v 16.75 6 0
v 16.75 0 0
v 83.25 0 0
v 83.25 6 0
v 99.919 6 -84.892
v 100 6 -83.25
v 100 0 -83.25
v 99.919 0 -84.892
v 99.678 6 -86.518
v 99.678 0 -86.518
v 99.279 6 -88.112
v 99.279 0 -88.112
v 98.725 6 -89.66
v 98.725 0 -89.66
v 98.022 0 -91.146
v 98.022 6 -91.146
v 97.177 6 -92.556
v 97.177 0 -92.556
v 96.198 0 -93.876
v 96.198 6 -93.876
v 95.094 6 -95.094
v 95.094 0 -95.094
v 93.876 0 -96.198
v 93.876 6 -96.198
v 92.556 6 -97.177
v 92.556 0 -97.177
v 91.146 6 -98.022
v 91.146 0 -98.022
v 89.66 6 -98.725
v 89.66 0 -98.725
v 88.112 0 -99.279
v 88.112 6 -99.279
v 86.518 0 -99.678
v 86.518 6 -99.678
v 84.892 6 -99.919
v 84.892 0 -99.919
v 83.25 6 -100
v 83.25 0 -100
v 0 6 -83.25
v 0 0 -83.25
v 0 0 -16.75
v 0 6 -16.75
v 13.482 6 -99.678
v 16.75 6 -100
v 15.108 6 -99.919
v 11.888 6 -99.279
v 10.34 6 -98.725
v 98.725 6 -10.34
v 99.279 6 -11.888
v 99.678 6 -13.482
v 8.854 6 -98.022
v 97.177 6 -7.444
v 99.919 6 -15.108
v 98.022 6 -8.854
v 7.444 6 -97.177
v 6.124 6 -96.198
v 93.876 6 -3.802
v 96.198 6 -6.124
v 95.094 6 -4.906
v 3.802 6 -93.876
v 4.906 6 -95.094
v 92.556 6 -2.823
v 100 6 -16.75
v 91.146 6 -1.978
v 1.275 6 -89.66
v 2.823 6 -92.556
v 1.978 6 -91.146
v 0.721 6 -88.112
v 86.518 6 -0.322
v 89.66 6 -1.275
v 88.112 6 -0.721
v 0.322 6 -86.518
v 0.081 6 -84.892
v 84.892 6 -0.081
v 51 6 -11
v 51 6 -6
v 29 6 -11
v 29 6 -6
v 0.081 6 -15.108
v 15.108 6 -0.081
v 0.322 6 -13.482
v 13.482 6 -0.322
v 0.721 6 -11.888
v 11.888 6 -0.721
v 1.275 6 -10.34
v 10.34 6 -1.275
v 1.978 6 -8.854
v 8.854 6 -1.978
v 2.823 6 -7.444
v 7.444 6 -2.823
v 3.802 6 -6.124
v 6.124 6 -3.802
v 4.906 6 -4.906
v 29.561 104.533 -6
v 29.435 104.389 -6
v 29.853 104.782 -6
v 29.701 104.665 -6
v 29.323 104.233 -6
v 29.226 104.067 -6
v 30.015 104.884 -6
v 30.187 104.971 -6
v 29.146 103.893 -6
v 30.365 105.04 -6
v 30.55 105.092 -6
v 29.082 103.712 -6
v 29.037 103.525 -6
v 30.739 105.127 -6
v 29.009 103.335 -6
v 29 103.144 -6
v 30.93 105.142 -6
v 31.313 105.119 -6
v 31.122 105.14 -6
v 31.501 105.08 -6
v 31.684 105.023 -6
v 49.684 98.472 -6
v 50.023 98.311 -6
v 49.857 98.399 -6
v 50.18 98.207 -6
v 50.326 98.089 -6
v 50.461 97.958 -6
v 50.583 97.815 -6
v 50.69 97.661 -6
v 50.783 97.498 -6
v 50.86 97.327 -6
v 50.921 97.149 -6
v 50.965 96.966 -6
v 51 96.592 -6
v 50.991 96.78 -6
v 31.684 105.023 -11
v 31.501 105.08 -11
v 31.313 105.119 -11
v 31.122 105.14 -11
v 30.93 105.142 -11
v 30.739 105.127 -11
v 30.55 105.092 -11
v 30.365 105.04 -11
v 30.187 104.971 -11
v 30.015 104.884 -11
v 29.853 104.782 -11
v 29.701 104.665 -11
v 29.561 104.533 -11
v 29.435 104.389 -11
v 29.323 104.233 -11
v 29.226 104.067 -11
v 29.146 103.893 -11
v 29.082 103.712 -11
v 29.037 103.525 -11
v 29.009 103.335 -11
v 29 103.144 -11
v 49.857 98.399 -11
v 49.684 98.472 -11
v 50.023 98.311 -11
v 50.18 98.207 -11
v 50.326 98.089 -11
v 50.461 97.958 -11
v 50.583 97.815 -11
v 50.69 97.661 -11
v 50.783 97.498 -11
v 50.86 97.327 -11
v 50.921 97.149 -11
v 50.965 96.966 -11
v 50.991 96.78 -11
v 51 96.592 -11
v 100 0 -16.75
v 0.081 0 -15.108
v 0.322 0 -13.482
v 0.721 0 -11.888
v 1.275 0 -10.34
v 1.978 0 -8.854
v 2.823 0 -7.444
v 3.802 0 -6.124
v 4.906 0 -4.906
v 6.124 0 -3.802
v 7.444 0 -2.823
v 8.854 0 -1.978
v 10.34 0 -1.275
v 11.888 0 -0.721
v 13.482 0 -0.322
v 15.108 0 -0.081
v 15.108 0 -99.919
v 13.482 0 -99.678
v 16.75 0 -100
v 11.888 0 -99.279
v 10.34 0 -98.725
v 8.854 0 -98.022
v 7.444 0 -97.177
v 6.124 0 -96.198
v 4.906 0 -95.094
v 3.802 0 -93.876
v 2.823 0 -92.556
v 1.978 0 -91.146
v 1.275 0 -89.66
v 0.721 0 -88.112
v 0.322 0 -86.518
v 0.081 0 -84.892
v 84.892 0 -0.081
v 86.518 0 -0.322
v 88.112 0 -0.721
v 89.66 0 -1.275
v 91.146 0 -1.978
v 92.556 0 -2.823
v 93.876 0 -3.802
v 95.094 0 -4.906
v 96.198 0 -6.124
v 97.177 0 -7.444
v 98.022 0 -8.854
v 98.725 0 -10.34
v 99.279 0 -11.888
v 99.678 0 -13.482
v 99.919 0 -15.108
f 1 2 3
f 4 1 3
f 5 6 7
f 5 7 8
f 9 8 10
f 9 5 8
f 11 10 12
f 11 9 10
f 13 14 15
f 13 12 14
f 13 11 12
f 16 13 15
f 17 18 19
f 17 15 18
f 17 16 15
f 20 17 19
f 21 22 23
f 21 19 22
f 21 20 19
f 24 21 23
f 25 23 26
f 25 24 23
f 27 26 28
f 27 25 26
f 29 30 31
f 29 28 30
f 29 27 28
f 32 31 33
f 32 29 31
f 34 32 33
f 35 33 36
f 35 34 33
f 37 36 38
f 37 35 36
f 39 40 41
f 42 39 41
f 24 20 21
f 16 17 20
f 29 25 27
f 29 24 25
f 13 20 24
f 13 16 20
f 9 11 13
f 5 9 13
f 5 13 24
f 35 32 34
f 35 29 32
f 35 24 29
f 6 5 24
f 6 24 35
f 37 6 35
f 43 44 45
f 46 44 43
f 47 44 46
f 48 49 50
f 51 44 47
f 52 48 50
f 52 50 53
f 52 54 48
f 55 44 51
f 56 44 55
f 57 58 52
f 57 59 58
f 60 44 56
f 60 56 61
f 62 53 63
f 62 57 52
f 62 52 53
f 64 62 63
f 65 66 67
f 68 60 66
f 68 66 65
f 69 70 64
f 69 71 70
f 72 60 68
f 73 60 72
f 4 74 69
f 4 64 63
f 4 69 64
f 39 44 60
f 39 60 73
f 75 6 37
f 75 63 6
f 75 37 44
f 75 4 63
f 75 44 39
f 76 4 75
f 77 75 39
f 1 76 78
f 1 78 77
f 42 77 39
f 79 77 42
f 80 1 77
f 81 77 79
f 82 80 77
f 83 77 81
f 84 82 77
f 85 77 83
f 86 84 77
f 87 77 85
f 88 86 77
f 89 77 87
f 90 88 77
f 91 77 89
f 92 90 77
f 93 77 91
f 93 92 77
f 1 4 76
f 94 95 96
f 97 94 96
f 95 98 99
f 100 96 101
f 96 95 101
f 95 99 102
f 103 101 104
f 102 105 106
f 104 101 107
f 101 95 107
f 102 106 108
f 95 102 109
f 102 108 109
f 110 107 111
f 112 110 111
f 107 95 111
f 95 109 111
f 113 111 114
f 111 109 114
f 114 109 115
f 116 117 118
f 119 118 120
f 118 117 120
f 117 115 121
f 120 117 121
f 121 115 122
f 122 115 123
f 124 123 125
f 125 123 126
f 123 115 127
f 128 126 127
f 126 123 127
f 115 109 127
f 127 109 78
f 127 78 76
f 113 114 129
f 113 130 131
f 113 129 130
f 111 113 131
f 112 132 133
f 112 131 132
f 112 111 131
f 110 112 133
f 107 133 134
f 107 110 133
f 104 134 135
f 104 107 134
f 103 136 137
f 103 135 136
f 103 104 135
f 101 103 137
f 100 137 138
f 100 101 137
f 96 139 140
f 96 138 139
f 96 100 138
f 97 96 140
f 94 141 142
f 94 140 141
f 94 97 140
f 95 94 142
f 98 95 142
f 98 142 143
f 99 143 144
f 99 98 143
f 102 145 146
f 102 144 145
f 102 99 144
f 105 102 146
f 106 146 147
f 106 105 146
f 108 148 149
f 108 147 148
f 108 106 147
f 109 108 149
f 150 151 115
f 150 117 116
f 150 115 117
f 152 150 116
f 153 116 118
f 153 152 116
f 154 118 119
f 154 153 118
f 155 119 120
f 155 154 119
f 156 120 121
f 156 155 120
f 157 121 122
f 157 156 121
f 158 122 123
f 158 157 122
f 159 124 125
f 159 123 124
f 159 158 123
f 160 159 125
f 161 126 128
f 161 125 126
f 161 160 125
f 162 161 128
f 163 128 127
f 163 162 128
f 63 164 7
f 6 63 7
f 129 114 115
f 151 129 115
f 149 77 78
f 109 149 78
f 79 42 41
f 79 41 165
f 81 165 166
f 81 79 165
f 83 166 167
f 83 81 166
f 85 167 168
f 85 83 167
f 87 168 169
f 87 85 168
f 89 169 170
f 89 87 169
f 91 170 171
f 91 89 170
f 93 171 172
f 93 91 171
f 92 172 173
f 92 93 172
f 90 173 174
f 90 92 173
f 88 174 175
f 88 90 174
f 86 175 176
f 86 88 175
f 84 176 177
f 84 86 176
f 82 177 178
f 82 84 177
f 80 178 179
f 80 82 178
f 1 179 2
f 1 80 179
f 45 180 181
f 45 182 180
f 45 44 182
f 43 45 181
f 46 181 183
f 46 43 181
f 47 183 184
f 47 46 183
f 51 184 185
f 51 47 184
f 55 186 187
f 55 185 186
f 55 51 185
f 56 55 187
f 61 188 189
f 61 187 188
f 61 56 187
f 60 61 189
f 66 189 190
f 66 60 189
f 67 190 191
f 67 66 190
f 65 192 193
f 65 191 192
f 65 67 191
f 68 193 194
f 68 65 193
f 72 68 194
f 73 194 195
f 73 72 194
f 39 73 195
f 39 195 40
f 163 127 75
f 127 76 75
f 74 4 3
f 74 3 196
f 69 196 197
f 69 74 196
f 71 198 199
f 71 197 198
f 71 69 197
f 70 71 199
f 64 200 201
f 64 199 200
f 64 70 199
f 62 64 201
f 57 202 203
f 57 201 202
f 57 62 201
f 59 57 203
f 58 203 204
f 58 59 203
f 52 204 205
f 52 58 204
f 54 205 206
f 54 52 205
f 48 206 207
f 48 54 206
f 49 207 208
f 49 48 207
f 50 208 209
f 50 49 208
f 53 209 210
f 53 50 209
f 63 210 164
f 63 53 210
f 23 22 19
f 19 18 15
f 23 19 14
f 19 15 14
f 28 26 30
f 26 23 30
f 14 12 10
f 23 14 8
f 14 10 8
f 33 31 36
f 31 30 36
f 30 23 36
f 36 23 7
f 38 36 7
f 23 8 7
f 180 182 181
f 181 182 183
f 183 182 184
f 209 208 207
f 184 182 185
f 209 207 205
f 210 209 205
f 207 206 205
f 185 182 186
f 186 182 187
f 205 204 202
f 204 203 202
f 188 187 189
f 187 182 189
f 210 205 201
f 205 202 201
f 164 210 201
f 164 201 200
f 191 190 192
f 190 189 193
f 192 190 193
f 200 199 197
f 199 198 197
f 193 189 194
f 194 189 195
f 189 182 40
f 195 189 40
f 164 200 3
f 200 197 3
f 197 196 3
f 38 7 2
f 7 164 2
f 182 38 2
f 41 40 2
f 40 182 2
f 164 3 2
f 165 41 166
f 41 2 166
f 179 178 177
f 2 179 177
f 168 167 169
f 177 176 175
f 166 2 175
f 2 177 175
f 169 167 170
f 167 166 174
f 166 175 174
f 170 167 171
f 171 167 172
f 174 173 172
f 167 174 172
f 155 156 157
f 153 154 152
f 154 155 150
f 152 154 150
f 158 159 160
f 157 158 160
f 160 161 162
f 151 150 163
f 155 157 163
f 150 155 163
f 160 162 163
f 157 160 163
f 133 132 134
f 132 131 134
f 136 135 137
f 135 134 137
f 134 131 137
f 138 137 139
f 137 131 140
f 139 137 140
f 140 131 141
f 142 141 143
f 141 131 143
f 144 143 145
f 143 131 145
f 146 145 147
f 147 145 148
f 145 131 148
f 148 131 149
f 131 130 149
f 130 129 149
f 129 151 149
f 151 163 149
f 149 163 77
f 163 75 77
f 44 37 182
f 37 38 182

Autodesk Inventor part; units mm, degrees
ref_plane "YZ Plane" through (0, 0, 0) normal (1, 0, 0) x (0, 1, 0)
ref_plane "XZ Plane" through (0, 0, 0) normal (0, 1, 0) x (-1, 0, 0)
ref_plane "XY Plane" through (0, 0, 0) normal (0, 0, 1) x (1, 0, 0)
sketch "Sketch1" plane through (0, 0, 0) normal (0, 1, 0) x (-1, 0, 0)
  line L0 (0, 0) -> (-100, 0)
  line L1 (-100, 0) -> (-100, -100)
  line L2 (-100, -100) -> (0, -100)
  line L3 (0, -100) -> (0, 0)
  dimension "d0" = 100
  dimension "d1" = 100
extrude "Extrusion1" add sketch "Sketch1" along normal blind 6
fillet "Fillet1" radius 16.75 4 edges at (100, 3, 0) (100, 3, -100) (0, 3, 0) (0, 3, -100)
sketch "Sketch2" plane through (0, 6, 0) normal (0, 1, 0) x (1, 0, 0)
  line L0 (16.75, 0) -> (83.25, 0) projected
  line L1 (40, 6) -> (51, 6)
  line L2 (51, 6) -> (51, 11)
  line L3 (51, 11) -> (29, 11)
  line L4 (29, 11) -> (29, 6)
  line L5 (29, 6) -> (40, 6)
  point P0 (0, 0)
extrude "Extrusion2" add sketch "Sketch2" along normal blind 100
sketch "Sketch3" plane through (29, 6, -6) normal (0, 0, 1) x (1, 0, 0)
  line L0 (0, 100) -> (22, 100) projected
  line L1 (0, 100) -> (22, 91.9927)
  line L2 (22, 0) -> (22, 100) projected
  line L3 (0, 100) -> (23.4119, 100) construction
  line L4 (22, 91.9927) -> (22, 100)
  line L5 (22, 100) -> (0, 100)
  point P0 (-29, -6)
  dimension "d12" = 20
extrude "Extrusion3" cut sketch "Sketch3" against normal blind 10
fillet "Fillet2" radius 2 2 edges at (29, 106, -8.5) (51, 97.9927, -8.5)
sketch "Sketch4" plane through (51, 6, -11) normal (0, 0, -1) x (-1, 0, 0)
  point P0 (51, -6)
sketch "Sketch5" plane through (29, 6, -6) normal (0, 0, 1) x (1, 0, 0)
  line L0 (0, 99.0231) -> (22, 99.0231)
  point P0 (-29, -6)
properties part number "SmartWatch_Base"
